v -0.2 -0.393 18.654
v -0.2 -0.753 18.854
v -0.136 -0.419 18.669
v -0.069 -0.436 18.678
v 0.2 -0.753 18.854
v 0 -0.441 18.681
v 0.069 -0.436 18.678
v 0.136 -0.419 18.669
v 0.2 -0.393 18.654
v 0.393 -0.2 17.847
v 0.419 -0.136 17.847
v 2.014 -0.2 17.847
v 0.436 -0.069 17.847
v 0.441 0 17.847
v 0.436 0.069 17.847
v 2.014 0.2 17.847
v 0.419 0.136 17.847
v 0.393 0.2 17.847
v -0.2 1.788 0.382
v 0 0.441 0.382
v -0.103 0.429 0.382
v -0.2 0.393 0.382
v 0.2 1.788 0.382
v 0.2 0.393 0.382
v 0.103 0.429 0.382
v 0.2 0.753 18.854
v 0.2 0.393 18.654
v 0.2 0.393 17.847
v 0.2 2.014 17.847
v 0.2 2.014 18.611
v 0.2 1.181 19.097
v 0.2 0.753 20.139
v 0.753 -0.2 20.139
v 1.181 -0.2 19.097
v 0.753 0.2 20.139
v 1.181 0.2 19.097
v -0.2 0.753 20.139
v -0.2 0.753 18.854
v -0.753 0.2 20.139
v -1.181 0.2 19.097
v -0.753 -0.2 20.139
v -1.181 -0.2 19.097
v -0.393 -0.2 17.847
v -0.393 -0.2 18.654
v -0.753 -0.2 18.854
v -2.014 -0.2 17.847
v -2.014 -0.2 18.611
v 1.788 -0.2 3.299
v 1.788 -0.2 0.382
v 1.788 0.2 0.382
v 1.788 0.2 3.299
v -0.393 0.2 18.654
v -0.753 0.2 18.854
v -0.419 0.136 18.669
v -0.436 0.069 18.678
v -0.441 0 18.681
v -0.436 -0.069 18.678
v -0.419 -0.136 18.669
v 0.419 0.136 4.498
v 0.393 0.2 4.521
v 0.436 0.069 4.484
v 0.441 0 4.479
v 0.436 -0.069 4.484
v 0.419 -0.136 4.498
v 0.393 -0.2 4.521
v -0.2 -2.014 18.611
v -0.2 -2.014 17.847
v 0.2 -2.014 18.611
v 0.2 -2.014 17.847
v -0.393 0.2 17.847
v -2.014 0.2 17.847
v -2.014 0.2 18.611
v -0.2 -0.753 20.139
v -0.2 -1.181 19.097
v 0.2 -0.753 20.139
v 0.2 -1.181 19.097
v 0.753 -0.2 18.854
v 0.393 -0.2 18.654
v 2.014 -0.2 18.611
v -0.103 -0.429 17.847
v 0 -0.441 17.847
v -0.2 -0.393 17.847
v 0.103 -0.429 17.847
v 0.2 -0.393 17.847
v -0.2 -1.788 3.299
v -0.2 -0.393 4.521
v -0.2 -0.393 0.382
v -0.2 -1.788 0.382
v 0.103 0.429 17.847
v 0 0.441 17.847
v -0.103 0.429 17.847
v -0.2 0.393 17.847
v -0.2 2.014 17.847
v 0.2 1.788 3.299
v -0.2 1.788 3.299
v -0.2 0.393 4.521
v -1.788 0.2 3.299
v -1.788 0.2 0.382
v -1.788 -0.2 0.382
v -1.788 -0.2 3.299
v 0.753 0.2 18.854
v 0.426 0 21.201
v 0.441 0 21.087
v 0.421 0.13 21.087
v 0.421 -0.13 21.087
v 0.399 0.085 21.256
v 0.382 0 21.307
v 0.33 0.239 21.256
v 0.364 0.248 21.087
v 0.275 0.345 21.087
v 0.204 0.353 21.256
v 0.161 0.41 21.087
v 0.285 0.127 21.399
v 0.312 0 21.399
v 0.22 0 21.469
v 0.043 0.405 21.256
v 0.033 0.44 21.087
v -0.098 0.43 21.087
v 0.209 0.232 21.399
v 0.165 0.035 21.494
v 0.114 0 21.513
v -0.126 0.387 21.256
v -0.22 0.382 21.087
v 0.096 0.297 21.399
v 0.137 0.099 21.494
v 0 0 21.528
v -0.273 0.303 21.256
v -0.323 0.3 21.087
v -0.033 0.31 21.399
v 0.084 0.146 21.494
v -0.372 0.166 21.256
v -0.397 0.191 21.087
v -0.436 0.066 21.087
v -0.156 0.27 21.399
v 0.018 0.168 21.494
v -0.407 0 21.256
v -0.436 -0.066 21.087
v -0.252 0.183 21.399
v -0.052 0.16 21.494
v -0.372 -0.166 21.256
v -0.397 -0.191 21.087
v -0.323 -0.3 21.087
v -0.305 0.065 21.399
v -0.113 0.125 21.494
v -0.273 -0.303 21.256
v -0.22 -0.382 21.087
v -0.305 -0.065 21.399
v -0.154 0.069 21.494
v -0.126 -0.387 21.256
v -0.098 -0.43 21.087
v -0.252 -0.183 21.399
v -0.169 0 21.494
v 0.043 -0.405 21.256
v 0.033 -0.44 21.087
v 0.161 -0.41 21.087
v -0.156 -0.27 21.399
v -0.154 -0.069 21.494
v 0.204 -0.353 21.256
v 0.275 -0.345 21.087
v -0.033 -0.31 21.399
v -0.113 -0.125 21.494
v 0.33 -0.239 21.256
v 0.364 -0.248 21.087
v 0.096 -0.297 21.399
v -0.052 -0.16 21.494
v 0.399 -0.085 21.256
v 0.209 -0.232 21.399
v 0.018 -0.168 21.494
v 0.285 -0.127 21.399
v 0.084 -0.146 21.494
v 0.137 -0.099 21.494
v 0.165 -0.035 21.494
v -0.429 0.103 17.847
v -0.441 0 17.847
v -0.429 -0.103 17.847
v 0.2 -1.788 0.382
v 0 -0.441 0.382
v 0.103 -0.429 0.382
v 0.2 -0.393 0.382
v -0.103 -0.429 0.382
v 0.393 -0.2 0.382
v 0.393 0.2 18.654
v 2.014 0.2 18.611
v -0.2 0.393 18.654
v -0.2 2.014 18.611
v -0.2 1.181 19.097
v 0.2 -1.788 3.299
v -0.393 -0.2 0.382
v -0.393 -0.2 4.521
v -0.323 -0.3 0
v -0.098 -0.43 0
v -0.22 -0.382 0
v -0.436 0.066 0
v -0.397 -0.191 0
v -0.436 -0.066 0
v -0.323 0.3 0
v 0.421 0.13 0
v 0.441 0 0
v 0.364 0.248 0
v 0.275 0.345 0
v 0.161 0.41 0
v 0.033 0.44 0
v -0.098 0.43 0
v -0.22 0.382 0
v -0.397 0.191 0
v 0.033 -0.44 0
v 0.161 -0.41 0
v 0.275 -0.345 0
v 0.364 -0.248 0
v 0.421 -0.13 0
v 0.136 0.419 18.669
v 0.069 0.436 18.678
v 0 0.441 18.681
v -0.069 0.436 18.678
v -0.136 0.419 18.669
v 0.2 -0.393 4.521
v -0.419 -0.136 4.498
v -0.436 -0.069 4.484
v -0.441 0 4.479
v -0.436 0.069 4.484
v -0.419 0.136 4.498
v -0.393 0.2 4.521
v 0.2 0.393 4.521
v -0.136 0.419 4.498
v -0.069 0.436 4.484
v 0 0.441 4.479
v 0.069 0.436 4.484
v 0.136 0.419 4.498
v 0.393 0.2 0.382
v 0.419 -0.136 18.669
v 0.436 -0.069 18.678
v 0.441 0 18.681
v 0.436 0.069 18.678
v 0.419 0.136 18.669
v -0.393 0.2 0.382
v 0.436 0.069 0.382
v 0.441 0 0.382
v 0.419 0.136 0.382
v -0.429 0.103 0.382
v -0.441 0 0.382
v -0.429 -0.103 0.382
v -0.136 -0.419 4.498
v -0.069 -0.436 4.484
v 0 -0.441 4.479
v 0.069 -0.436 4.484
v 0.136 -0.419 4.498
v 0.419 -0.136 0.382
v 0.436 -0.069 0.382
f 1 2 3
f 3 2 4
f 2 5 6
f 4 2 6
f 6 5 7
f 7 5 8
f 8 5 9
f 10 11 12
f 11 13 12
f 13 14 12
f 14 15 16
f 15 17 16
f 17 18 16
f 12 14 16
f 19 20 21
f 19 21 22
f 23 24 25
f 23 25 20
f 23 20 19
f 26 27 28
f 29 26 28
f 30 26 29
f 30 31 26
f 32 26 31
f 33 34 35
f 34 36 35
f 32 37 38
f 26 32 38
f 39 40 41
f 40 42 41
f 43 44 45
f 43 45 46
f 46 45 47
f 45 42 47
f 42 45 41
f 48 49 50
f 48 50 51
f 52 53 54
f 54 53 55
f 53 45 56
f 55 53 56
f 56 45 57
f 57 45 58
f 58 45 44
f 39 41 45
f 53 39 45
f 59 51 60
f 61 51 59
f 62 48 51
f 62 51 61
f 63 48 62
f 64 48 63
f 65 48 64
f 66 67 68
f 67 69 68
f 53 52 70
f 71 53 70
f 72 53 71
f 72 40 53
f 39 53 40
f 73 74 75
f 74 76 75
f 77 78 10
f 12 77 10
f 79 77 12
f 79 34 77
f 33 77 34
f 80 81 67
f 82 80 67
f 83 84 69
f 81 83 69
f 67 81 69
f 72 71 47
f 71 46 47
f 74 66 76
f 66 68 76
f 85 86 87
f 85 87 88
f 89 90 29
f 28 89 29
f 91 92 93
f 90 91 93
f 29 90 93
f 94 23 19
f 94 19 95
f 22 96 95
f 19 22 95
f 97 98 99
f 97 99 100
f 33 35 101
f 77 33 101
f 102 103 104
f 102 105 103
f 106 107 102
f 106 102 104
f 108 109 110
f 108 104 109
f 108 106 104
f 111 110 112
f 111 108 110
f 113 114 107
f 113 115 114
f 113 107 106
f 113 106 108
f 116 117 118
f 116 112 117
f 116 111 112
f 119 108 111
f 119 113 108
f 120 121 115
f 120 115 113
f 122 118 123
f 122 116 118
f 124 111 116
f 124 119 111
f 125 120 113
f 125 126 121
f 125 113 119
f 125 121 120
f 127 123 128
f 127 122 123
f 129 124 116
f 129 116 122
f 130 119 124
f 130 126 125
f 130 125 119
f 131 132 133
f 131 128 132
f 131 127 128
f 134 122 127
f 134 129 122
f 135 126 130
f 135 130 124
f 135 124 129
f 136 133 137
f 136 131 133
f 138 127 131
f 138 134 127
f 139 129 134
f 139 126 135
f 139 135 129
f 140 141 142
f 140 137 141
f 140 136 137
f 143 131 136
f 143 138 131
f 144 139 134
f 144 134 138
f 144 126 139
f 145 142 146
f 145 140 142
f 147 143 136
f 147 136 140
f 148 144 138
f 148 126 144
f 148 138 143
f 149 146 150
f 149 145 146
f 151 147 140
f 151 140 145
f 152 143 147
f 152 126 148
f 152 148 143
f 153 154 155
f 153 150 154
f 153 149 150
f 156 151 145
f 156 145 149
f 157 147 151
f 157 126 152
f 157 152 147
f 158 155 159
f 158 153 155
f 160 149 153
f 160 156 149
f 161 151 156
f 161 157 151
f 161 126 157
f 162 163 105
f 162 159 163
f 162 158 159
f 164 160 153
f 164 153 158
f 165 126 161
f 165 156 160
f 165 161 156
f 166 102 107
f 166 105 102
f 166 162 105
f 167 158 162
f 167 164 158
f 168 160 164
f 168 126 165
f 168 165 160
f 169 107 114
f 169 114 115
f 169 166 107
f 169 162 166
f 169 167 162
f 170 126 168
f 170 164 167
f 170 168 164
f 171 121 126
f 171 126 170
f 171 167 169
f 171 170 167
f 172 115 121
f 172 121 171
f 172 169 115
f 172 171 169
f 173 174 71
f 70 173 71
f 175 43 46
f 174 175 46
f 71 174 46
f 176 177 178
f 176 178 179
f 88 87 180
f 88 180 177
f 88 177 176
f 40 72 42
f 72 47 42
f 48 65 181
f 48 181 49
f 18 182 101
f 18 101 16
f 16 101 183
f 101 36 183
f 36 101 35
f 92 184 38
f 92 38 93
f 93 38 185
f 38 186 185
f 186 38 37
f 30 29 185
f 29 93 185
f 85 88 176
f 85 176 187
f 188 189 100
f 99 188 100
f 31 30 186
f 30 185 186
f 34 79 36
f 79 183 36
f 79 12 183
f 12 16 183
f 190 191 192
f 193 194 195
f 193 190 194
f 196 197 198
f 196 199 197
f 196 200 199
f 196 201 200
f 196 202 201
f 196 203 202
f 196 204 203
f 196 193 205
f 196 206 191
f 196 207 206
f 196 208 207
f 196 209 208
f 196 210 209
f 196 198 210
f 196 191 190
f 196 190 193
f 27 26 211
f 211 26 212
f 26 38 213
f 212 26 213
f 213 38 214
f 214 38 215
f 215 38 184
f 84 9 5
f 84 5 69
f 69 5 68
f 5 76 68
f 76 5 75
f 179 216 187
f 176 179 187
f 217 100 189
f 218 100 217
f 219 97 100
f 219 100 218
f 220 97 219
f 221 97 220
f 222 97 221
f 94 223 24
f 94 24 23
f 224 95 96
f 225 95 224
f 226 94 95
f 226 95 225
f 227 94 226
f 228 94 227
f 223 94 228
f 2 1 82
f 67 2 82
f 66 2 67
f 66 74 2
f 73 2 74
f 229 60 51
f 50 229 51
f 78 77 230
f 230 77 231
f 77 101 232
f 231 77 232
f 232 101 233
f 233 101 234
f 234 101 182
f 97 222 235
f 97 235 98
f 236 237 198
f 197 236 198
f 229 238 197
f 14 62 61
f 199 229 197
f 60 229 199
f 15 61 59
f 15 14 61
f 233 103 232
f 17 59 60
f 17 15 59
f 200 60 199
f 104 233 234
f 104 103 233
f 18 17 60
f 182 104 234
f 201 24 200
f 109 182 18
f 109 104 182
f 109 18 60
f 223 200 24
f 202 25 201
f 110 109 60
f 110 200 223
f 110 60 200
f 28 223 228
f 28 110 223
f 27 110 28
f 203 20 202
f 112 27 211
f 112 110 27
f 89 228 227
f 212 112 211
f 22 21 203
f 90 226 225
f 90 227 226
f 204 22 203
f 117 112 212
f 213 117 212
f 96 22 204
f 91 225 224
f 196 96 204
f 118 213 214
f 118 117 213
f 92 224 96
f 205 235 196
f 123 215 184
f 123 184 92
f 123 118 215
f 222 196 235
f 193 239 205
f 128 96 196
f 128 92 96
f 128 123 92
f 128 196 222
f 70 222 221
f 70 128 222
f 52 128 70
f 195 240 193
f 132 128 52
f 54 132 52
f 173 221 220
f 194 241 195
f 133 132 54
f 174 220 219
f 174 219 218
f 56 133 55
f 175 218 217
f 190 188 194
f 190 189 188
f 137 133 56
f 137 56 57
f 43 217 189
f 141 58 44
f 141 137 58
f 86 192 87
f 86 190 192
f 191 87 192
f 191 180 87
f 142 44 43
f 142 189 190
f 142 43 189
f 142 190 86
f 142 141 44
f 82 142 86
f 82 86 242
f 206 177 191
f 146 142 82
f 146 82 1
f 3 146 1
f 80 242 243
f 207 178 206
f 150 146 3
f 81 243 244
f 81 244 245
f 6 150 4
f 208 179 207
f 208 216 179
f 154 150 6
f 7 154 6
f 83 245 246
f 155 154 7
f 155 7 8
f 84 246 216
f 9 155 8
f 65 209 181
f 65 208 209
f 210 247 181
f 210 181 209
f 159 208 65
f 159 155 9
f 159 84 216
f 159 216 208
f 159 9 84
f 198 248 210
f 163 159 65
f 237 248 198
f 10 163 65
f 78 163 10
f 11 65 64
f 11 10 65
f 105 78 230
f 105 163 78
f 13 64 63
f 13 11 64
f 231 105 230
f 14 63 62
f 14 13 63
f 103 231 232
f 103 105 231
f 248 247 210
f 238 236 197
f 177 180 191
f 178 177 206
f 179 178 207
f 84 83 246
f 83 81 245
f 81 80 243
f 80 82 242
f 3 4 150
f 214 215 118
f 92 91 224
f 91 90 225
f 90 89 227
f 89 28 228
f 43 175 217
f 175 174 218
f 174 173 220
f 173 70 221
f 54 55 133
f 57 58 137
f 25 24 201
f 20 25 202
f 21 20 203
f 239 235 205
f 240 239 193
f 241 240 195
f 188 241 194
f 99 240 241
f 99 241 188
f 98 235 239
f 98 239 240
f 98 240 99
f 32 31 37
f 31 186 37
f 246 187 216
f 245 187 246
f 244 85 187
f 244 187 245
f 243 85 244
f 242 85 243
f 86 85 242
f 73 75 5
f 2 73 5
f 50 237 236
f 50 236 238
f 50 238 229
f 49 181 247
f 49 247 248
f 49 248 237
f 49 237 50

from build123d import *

# Parameters (mm, degrees)
F3_DEPTH = 0.2
F4_COUNT = 4


# Not quite as in the source:
# - a feature names something its author has since deleted; it is built from what else it names


with BuildPart() as f1:
    # F0 (on Front) → F1 (revolve)
    with BuildSketch(Plane.XZ):
        with BuildLine():
            Line((0, 21.5277777778), (0, 0))
            Line((0, 0), (0.4409722222, 0))
            Line((0.4409722222, 0), (0.4409722222, 21.0868055556))
            ThreePointArc((0.4409722222, 21.0868055556), (0.3118144486, 21.3986200042), (0, 21.5277777778))
        make_face()
    revolve(axis=Axis((0, 0, 10.7638888889), (0, 0, 1)))

    # F2 (on Front) → F3 (join, symmetric)
    with BuildSketch(Plane.XZ):
        Polygon((0, 18.4355709877), (0, 17.8472222222), (2.0138888889, 17.8472222222), (2.0138888889, 18.6111111111), (1.1805555556, 19.0972222222), (0.7534722222, 20.1388888889), (0.7534722222, 18.8541666667), align=None)
        Polygon((0, 4.8655856243), (0, 0.3819444444), (1.7881944444, 0.3819444444), (1.7881944444, 3.2986111111), align=None)
    extrude(amount=F3_DEPTH, both=True)

    # F4: F1 ×4 about axis
    f4_axis = Axis((0, 0, 0), (0, 0, 1))


with BuildPart() as f1_1:
    add(f1.part)
    for i in range(1, F4_COUNT):
        add(f1.part.rotate(f4_axis, i * 360 / F4_COUNT))


solid = f1_1.part
